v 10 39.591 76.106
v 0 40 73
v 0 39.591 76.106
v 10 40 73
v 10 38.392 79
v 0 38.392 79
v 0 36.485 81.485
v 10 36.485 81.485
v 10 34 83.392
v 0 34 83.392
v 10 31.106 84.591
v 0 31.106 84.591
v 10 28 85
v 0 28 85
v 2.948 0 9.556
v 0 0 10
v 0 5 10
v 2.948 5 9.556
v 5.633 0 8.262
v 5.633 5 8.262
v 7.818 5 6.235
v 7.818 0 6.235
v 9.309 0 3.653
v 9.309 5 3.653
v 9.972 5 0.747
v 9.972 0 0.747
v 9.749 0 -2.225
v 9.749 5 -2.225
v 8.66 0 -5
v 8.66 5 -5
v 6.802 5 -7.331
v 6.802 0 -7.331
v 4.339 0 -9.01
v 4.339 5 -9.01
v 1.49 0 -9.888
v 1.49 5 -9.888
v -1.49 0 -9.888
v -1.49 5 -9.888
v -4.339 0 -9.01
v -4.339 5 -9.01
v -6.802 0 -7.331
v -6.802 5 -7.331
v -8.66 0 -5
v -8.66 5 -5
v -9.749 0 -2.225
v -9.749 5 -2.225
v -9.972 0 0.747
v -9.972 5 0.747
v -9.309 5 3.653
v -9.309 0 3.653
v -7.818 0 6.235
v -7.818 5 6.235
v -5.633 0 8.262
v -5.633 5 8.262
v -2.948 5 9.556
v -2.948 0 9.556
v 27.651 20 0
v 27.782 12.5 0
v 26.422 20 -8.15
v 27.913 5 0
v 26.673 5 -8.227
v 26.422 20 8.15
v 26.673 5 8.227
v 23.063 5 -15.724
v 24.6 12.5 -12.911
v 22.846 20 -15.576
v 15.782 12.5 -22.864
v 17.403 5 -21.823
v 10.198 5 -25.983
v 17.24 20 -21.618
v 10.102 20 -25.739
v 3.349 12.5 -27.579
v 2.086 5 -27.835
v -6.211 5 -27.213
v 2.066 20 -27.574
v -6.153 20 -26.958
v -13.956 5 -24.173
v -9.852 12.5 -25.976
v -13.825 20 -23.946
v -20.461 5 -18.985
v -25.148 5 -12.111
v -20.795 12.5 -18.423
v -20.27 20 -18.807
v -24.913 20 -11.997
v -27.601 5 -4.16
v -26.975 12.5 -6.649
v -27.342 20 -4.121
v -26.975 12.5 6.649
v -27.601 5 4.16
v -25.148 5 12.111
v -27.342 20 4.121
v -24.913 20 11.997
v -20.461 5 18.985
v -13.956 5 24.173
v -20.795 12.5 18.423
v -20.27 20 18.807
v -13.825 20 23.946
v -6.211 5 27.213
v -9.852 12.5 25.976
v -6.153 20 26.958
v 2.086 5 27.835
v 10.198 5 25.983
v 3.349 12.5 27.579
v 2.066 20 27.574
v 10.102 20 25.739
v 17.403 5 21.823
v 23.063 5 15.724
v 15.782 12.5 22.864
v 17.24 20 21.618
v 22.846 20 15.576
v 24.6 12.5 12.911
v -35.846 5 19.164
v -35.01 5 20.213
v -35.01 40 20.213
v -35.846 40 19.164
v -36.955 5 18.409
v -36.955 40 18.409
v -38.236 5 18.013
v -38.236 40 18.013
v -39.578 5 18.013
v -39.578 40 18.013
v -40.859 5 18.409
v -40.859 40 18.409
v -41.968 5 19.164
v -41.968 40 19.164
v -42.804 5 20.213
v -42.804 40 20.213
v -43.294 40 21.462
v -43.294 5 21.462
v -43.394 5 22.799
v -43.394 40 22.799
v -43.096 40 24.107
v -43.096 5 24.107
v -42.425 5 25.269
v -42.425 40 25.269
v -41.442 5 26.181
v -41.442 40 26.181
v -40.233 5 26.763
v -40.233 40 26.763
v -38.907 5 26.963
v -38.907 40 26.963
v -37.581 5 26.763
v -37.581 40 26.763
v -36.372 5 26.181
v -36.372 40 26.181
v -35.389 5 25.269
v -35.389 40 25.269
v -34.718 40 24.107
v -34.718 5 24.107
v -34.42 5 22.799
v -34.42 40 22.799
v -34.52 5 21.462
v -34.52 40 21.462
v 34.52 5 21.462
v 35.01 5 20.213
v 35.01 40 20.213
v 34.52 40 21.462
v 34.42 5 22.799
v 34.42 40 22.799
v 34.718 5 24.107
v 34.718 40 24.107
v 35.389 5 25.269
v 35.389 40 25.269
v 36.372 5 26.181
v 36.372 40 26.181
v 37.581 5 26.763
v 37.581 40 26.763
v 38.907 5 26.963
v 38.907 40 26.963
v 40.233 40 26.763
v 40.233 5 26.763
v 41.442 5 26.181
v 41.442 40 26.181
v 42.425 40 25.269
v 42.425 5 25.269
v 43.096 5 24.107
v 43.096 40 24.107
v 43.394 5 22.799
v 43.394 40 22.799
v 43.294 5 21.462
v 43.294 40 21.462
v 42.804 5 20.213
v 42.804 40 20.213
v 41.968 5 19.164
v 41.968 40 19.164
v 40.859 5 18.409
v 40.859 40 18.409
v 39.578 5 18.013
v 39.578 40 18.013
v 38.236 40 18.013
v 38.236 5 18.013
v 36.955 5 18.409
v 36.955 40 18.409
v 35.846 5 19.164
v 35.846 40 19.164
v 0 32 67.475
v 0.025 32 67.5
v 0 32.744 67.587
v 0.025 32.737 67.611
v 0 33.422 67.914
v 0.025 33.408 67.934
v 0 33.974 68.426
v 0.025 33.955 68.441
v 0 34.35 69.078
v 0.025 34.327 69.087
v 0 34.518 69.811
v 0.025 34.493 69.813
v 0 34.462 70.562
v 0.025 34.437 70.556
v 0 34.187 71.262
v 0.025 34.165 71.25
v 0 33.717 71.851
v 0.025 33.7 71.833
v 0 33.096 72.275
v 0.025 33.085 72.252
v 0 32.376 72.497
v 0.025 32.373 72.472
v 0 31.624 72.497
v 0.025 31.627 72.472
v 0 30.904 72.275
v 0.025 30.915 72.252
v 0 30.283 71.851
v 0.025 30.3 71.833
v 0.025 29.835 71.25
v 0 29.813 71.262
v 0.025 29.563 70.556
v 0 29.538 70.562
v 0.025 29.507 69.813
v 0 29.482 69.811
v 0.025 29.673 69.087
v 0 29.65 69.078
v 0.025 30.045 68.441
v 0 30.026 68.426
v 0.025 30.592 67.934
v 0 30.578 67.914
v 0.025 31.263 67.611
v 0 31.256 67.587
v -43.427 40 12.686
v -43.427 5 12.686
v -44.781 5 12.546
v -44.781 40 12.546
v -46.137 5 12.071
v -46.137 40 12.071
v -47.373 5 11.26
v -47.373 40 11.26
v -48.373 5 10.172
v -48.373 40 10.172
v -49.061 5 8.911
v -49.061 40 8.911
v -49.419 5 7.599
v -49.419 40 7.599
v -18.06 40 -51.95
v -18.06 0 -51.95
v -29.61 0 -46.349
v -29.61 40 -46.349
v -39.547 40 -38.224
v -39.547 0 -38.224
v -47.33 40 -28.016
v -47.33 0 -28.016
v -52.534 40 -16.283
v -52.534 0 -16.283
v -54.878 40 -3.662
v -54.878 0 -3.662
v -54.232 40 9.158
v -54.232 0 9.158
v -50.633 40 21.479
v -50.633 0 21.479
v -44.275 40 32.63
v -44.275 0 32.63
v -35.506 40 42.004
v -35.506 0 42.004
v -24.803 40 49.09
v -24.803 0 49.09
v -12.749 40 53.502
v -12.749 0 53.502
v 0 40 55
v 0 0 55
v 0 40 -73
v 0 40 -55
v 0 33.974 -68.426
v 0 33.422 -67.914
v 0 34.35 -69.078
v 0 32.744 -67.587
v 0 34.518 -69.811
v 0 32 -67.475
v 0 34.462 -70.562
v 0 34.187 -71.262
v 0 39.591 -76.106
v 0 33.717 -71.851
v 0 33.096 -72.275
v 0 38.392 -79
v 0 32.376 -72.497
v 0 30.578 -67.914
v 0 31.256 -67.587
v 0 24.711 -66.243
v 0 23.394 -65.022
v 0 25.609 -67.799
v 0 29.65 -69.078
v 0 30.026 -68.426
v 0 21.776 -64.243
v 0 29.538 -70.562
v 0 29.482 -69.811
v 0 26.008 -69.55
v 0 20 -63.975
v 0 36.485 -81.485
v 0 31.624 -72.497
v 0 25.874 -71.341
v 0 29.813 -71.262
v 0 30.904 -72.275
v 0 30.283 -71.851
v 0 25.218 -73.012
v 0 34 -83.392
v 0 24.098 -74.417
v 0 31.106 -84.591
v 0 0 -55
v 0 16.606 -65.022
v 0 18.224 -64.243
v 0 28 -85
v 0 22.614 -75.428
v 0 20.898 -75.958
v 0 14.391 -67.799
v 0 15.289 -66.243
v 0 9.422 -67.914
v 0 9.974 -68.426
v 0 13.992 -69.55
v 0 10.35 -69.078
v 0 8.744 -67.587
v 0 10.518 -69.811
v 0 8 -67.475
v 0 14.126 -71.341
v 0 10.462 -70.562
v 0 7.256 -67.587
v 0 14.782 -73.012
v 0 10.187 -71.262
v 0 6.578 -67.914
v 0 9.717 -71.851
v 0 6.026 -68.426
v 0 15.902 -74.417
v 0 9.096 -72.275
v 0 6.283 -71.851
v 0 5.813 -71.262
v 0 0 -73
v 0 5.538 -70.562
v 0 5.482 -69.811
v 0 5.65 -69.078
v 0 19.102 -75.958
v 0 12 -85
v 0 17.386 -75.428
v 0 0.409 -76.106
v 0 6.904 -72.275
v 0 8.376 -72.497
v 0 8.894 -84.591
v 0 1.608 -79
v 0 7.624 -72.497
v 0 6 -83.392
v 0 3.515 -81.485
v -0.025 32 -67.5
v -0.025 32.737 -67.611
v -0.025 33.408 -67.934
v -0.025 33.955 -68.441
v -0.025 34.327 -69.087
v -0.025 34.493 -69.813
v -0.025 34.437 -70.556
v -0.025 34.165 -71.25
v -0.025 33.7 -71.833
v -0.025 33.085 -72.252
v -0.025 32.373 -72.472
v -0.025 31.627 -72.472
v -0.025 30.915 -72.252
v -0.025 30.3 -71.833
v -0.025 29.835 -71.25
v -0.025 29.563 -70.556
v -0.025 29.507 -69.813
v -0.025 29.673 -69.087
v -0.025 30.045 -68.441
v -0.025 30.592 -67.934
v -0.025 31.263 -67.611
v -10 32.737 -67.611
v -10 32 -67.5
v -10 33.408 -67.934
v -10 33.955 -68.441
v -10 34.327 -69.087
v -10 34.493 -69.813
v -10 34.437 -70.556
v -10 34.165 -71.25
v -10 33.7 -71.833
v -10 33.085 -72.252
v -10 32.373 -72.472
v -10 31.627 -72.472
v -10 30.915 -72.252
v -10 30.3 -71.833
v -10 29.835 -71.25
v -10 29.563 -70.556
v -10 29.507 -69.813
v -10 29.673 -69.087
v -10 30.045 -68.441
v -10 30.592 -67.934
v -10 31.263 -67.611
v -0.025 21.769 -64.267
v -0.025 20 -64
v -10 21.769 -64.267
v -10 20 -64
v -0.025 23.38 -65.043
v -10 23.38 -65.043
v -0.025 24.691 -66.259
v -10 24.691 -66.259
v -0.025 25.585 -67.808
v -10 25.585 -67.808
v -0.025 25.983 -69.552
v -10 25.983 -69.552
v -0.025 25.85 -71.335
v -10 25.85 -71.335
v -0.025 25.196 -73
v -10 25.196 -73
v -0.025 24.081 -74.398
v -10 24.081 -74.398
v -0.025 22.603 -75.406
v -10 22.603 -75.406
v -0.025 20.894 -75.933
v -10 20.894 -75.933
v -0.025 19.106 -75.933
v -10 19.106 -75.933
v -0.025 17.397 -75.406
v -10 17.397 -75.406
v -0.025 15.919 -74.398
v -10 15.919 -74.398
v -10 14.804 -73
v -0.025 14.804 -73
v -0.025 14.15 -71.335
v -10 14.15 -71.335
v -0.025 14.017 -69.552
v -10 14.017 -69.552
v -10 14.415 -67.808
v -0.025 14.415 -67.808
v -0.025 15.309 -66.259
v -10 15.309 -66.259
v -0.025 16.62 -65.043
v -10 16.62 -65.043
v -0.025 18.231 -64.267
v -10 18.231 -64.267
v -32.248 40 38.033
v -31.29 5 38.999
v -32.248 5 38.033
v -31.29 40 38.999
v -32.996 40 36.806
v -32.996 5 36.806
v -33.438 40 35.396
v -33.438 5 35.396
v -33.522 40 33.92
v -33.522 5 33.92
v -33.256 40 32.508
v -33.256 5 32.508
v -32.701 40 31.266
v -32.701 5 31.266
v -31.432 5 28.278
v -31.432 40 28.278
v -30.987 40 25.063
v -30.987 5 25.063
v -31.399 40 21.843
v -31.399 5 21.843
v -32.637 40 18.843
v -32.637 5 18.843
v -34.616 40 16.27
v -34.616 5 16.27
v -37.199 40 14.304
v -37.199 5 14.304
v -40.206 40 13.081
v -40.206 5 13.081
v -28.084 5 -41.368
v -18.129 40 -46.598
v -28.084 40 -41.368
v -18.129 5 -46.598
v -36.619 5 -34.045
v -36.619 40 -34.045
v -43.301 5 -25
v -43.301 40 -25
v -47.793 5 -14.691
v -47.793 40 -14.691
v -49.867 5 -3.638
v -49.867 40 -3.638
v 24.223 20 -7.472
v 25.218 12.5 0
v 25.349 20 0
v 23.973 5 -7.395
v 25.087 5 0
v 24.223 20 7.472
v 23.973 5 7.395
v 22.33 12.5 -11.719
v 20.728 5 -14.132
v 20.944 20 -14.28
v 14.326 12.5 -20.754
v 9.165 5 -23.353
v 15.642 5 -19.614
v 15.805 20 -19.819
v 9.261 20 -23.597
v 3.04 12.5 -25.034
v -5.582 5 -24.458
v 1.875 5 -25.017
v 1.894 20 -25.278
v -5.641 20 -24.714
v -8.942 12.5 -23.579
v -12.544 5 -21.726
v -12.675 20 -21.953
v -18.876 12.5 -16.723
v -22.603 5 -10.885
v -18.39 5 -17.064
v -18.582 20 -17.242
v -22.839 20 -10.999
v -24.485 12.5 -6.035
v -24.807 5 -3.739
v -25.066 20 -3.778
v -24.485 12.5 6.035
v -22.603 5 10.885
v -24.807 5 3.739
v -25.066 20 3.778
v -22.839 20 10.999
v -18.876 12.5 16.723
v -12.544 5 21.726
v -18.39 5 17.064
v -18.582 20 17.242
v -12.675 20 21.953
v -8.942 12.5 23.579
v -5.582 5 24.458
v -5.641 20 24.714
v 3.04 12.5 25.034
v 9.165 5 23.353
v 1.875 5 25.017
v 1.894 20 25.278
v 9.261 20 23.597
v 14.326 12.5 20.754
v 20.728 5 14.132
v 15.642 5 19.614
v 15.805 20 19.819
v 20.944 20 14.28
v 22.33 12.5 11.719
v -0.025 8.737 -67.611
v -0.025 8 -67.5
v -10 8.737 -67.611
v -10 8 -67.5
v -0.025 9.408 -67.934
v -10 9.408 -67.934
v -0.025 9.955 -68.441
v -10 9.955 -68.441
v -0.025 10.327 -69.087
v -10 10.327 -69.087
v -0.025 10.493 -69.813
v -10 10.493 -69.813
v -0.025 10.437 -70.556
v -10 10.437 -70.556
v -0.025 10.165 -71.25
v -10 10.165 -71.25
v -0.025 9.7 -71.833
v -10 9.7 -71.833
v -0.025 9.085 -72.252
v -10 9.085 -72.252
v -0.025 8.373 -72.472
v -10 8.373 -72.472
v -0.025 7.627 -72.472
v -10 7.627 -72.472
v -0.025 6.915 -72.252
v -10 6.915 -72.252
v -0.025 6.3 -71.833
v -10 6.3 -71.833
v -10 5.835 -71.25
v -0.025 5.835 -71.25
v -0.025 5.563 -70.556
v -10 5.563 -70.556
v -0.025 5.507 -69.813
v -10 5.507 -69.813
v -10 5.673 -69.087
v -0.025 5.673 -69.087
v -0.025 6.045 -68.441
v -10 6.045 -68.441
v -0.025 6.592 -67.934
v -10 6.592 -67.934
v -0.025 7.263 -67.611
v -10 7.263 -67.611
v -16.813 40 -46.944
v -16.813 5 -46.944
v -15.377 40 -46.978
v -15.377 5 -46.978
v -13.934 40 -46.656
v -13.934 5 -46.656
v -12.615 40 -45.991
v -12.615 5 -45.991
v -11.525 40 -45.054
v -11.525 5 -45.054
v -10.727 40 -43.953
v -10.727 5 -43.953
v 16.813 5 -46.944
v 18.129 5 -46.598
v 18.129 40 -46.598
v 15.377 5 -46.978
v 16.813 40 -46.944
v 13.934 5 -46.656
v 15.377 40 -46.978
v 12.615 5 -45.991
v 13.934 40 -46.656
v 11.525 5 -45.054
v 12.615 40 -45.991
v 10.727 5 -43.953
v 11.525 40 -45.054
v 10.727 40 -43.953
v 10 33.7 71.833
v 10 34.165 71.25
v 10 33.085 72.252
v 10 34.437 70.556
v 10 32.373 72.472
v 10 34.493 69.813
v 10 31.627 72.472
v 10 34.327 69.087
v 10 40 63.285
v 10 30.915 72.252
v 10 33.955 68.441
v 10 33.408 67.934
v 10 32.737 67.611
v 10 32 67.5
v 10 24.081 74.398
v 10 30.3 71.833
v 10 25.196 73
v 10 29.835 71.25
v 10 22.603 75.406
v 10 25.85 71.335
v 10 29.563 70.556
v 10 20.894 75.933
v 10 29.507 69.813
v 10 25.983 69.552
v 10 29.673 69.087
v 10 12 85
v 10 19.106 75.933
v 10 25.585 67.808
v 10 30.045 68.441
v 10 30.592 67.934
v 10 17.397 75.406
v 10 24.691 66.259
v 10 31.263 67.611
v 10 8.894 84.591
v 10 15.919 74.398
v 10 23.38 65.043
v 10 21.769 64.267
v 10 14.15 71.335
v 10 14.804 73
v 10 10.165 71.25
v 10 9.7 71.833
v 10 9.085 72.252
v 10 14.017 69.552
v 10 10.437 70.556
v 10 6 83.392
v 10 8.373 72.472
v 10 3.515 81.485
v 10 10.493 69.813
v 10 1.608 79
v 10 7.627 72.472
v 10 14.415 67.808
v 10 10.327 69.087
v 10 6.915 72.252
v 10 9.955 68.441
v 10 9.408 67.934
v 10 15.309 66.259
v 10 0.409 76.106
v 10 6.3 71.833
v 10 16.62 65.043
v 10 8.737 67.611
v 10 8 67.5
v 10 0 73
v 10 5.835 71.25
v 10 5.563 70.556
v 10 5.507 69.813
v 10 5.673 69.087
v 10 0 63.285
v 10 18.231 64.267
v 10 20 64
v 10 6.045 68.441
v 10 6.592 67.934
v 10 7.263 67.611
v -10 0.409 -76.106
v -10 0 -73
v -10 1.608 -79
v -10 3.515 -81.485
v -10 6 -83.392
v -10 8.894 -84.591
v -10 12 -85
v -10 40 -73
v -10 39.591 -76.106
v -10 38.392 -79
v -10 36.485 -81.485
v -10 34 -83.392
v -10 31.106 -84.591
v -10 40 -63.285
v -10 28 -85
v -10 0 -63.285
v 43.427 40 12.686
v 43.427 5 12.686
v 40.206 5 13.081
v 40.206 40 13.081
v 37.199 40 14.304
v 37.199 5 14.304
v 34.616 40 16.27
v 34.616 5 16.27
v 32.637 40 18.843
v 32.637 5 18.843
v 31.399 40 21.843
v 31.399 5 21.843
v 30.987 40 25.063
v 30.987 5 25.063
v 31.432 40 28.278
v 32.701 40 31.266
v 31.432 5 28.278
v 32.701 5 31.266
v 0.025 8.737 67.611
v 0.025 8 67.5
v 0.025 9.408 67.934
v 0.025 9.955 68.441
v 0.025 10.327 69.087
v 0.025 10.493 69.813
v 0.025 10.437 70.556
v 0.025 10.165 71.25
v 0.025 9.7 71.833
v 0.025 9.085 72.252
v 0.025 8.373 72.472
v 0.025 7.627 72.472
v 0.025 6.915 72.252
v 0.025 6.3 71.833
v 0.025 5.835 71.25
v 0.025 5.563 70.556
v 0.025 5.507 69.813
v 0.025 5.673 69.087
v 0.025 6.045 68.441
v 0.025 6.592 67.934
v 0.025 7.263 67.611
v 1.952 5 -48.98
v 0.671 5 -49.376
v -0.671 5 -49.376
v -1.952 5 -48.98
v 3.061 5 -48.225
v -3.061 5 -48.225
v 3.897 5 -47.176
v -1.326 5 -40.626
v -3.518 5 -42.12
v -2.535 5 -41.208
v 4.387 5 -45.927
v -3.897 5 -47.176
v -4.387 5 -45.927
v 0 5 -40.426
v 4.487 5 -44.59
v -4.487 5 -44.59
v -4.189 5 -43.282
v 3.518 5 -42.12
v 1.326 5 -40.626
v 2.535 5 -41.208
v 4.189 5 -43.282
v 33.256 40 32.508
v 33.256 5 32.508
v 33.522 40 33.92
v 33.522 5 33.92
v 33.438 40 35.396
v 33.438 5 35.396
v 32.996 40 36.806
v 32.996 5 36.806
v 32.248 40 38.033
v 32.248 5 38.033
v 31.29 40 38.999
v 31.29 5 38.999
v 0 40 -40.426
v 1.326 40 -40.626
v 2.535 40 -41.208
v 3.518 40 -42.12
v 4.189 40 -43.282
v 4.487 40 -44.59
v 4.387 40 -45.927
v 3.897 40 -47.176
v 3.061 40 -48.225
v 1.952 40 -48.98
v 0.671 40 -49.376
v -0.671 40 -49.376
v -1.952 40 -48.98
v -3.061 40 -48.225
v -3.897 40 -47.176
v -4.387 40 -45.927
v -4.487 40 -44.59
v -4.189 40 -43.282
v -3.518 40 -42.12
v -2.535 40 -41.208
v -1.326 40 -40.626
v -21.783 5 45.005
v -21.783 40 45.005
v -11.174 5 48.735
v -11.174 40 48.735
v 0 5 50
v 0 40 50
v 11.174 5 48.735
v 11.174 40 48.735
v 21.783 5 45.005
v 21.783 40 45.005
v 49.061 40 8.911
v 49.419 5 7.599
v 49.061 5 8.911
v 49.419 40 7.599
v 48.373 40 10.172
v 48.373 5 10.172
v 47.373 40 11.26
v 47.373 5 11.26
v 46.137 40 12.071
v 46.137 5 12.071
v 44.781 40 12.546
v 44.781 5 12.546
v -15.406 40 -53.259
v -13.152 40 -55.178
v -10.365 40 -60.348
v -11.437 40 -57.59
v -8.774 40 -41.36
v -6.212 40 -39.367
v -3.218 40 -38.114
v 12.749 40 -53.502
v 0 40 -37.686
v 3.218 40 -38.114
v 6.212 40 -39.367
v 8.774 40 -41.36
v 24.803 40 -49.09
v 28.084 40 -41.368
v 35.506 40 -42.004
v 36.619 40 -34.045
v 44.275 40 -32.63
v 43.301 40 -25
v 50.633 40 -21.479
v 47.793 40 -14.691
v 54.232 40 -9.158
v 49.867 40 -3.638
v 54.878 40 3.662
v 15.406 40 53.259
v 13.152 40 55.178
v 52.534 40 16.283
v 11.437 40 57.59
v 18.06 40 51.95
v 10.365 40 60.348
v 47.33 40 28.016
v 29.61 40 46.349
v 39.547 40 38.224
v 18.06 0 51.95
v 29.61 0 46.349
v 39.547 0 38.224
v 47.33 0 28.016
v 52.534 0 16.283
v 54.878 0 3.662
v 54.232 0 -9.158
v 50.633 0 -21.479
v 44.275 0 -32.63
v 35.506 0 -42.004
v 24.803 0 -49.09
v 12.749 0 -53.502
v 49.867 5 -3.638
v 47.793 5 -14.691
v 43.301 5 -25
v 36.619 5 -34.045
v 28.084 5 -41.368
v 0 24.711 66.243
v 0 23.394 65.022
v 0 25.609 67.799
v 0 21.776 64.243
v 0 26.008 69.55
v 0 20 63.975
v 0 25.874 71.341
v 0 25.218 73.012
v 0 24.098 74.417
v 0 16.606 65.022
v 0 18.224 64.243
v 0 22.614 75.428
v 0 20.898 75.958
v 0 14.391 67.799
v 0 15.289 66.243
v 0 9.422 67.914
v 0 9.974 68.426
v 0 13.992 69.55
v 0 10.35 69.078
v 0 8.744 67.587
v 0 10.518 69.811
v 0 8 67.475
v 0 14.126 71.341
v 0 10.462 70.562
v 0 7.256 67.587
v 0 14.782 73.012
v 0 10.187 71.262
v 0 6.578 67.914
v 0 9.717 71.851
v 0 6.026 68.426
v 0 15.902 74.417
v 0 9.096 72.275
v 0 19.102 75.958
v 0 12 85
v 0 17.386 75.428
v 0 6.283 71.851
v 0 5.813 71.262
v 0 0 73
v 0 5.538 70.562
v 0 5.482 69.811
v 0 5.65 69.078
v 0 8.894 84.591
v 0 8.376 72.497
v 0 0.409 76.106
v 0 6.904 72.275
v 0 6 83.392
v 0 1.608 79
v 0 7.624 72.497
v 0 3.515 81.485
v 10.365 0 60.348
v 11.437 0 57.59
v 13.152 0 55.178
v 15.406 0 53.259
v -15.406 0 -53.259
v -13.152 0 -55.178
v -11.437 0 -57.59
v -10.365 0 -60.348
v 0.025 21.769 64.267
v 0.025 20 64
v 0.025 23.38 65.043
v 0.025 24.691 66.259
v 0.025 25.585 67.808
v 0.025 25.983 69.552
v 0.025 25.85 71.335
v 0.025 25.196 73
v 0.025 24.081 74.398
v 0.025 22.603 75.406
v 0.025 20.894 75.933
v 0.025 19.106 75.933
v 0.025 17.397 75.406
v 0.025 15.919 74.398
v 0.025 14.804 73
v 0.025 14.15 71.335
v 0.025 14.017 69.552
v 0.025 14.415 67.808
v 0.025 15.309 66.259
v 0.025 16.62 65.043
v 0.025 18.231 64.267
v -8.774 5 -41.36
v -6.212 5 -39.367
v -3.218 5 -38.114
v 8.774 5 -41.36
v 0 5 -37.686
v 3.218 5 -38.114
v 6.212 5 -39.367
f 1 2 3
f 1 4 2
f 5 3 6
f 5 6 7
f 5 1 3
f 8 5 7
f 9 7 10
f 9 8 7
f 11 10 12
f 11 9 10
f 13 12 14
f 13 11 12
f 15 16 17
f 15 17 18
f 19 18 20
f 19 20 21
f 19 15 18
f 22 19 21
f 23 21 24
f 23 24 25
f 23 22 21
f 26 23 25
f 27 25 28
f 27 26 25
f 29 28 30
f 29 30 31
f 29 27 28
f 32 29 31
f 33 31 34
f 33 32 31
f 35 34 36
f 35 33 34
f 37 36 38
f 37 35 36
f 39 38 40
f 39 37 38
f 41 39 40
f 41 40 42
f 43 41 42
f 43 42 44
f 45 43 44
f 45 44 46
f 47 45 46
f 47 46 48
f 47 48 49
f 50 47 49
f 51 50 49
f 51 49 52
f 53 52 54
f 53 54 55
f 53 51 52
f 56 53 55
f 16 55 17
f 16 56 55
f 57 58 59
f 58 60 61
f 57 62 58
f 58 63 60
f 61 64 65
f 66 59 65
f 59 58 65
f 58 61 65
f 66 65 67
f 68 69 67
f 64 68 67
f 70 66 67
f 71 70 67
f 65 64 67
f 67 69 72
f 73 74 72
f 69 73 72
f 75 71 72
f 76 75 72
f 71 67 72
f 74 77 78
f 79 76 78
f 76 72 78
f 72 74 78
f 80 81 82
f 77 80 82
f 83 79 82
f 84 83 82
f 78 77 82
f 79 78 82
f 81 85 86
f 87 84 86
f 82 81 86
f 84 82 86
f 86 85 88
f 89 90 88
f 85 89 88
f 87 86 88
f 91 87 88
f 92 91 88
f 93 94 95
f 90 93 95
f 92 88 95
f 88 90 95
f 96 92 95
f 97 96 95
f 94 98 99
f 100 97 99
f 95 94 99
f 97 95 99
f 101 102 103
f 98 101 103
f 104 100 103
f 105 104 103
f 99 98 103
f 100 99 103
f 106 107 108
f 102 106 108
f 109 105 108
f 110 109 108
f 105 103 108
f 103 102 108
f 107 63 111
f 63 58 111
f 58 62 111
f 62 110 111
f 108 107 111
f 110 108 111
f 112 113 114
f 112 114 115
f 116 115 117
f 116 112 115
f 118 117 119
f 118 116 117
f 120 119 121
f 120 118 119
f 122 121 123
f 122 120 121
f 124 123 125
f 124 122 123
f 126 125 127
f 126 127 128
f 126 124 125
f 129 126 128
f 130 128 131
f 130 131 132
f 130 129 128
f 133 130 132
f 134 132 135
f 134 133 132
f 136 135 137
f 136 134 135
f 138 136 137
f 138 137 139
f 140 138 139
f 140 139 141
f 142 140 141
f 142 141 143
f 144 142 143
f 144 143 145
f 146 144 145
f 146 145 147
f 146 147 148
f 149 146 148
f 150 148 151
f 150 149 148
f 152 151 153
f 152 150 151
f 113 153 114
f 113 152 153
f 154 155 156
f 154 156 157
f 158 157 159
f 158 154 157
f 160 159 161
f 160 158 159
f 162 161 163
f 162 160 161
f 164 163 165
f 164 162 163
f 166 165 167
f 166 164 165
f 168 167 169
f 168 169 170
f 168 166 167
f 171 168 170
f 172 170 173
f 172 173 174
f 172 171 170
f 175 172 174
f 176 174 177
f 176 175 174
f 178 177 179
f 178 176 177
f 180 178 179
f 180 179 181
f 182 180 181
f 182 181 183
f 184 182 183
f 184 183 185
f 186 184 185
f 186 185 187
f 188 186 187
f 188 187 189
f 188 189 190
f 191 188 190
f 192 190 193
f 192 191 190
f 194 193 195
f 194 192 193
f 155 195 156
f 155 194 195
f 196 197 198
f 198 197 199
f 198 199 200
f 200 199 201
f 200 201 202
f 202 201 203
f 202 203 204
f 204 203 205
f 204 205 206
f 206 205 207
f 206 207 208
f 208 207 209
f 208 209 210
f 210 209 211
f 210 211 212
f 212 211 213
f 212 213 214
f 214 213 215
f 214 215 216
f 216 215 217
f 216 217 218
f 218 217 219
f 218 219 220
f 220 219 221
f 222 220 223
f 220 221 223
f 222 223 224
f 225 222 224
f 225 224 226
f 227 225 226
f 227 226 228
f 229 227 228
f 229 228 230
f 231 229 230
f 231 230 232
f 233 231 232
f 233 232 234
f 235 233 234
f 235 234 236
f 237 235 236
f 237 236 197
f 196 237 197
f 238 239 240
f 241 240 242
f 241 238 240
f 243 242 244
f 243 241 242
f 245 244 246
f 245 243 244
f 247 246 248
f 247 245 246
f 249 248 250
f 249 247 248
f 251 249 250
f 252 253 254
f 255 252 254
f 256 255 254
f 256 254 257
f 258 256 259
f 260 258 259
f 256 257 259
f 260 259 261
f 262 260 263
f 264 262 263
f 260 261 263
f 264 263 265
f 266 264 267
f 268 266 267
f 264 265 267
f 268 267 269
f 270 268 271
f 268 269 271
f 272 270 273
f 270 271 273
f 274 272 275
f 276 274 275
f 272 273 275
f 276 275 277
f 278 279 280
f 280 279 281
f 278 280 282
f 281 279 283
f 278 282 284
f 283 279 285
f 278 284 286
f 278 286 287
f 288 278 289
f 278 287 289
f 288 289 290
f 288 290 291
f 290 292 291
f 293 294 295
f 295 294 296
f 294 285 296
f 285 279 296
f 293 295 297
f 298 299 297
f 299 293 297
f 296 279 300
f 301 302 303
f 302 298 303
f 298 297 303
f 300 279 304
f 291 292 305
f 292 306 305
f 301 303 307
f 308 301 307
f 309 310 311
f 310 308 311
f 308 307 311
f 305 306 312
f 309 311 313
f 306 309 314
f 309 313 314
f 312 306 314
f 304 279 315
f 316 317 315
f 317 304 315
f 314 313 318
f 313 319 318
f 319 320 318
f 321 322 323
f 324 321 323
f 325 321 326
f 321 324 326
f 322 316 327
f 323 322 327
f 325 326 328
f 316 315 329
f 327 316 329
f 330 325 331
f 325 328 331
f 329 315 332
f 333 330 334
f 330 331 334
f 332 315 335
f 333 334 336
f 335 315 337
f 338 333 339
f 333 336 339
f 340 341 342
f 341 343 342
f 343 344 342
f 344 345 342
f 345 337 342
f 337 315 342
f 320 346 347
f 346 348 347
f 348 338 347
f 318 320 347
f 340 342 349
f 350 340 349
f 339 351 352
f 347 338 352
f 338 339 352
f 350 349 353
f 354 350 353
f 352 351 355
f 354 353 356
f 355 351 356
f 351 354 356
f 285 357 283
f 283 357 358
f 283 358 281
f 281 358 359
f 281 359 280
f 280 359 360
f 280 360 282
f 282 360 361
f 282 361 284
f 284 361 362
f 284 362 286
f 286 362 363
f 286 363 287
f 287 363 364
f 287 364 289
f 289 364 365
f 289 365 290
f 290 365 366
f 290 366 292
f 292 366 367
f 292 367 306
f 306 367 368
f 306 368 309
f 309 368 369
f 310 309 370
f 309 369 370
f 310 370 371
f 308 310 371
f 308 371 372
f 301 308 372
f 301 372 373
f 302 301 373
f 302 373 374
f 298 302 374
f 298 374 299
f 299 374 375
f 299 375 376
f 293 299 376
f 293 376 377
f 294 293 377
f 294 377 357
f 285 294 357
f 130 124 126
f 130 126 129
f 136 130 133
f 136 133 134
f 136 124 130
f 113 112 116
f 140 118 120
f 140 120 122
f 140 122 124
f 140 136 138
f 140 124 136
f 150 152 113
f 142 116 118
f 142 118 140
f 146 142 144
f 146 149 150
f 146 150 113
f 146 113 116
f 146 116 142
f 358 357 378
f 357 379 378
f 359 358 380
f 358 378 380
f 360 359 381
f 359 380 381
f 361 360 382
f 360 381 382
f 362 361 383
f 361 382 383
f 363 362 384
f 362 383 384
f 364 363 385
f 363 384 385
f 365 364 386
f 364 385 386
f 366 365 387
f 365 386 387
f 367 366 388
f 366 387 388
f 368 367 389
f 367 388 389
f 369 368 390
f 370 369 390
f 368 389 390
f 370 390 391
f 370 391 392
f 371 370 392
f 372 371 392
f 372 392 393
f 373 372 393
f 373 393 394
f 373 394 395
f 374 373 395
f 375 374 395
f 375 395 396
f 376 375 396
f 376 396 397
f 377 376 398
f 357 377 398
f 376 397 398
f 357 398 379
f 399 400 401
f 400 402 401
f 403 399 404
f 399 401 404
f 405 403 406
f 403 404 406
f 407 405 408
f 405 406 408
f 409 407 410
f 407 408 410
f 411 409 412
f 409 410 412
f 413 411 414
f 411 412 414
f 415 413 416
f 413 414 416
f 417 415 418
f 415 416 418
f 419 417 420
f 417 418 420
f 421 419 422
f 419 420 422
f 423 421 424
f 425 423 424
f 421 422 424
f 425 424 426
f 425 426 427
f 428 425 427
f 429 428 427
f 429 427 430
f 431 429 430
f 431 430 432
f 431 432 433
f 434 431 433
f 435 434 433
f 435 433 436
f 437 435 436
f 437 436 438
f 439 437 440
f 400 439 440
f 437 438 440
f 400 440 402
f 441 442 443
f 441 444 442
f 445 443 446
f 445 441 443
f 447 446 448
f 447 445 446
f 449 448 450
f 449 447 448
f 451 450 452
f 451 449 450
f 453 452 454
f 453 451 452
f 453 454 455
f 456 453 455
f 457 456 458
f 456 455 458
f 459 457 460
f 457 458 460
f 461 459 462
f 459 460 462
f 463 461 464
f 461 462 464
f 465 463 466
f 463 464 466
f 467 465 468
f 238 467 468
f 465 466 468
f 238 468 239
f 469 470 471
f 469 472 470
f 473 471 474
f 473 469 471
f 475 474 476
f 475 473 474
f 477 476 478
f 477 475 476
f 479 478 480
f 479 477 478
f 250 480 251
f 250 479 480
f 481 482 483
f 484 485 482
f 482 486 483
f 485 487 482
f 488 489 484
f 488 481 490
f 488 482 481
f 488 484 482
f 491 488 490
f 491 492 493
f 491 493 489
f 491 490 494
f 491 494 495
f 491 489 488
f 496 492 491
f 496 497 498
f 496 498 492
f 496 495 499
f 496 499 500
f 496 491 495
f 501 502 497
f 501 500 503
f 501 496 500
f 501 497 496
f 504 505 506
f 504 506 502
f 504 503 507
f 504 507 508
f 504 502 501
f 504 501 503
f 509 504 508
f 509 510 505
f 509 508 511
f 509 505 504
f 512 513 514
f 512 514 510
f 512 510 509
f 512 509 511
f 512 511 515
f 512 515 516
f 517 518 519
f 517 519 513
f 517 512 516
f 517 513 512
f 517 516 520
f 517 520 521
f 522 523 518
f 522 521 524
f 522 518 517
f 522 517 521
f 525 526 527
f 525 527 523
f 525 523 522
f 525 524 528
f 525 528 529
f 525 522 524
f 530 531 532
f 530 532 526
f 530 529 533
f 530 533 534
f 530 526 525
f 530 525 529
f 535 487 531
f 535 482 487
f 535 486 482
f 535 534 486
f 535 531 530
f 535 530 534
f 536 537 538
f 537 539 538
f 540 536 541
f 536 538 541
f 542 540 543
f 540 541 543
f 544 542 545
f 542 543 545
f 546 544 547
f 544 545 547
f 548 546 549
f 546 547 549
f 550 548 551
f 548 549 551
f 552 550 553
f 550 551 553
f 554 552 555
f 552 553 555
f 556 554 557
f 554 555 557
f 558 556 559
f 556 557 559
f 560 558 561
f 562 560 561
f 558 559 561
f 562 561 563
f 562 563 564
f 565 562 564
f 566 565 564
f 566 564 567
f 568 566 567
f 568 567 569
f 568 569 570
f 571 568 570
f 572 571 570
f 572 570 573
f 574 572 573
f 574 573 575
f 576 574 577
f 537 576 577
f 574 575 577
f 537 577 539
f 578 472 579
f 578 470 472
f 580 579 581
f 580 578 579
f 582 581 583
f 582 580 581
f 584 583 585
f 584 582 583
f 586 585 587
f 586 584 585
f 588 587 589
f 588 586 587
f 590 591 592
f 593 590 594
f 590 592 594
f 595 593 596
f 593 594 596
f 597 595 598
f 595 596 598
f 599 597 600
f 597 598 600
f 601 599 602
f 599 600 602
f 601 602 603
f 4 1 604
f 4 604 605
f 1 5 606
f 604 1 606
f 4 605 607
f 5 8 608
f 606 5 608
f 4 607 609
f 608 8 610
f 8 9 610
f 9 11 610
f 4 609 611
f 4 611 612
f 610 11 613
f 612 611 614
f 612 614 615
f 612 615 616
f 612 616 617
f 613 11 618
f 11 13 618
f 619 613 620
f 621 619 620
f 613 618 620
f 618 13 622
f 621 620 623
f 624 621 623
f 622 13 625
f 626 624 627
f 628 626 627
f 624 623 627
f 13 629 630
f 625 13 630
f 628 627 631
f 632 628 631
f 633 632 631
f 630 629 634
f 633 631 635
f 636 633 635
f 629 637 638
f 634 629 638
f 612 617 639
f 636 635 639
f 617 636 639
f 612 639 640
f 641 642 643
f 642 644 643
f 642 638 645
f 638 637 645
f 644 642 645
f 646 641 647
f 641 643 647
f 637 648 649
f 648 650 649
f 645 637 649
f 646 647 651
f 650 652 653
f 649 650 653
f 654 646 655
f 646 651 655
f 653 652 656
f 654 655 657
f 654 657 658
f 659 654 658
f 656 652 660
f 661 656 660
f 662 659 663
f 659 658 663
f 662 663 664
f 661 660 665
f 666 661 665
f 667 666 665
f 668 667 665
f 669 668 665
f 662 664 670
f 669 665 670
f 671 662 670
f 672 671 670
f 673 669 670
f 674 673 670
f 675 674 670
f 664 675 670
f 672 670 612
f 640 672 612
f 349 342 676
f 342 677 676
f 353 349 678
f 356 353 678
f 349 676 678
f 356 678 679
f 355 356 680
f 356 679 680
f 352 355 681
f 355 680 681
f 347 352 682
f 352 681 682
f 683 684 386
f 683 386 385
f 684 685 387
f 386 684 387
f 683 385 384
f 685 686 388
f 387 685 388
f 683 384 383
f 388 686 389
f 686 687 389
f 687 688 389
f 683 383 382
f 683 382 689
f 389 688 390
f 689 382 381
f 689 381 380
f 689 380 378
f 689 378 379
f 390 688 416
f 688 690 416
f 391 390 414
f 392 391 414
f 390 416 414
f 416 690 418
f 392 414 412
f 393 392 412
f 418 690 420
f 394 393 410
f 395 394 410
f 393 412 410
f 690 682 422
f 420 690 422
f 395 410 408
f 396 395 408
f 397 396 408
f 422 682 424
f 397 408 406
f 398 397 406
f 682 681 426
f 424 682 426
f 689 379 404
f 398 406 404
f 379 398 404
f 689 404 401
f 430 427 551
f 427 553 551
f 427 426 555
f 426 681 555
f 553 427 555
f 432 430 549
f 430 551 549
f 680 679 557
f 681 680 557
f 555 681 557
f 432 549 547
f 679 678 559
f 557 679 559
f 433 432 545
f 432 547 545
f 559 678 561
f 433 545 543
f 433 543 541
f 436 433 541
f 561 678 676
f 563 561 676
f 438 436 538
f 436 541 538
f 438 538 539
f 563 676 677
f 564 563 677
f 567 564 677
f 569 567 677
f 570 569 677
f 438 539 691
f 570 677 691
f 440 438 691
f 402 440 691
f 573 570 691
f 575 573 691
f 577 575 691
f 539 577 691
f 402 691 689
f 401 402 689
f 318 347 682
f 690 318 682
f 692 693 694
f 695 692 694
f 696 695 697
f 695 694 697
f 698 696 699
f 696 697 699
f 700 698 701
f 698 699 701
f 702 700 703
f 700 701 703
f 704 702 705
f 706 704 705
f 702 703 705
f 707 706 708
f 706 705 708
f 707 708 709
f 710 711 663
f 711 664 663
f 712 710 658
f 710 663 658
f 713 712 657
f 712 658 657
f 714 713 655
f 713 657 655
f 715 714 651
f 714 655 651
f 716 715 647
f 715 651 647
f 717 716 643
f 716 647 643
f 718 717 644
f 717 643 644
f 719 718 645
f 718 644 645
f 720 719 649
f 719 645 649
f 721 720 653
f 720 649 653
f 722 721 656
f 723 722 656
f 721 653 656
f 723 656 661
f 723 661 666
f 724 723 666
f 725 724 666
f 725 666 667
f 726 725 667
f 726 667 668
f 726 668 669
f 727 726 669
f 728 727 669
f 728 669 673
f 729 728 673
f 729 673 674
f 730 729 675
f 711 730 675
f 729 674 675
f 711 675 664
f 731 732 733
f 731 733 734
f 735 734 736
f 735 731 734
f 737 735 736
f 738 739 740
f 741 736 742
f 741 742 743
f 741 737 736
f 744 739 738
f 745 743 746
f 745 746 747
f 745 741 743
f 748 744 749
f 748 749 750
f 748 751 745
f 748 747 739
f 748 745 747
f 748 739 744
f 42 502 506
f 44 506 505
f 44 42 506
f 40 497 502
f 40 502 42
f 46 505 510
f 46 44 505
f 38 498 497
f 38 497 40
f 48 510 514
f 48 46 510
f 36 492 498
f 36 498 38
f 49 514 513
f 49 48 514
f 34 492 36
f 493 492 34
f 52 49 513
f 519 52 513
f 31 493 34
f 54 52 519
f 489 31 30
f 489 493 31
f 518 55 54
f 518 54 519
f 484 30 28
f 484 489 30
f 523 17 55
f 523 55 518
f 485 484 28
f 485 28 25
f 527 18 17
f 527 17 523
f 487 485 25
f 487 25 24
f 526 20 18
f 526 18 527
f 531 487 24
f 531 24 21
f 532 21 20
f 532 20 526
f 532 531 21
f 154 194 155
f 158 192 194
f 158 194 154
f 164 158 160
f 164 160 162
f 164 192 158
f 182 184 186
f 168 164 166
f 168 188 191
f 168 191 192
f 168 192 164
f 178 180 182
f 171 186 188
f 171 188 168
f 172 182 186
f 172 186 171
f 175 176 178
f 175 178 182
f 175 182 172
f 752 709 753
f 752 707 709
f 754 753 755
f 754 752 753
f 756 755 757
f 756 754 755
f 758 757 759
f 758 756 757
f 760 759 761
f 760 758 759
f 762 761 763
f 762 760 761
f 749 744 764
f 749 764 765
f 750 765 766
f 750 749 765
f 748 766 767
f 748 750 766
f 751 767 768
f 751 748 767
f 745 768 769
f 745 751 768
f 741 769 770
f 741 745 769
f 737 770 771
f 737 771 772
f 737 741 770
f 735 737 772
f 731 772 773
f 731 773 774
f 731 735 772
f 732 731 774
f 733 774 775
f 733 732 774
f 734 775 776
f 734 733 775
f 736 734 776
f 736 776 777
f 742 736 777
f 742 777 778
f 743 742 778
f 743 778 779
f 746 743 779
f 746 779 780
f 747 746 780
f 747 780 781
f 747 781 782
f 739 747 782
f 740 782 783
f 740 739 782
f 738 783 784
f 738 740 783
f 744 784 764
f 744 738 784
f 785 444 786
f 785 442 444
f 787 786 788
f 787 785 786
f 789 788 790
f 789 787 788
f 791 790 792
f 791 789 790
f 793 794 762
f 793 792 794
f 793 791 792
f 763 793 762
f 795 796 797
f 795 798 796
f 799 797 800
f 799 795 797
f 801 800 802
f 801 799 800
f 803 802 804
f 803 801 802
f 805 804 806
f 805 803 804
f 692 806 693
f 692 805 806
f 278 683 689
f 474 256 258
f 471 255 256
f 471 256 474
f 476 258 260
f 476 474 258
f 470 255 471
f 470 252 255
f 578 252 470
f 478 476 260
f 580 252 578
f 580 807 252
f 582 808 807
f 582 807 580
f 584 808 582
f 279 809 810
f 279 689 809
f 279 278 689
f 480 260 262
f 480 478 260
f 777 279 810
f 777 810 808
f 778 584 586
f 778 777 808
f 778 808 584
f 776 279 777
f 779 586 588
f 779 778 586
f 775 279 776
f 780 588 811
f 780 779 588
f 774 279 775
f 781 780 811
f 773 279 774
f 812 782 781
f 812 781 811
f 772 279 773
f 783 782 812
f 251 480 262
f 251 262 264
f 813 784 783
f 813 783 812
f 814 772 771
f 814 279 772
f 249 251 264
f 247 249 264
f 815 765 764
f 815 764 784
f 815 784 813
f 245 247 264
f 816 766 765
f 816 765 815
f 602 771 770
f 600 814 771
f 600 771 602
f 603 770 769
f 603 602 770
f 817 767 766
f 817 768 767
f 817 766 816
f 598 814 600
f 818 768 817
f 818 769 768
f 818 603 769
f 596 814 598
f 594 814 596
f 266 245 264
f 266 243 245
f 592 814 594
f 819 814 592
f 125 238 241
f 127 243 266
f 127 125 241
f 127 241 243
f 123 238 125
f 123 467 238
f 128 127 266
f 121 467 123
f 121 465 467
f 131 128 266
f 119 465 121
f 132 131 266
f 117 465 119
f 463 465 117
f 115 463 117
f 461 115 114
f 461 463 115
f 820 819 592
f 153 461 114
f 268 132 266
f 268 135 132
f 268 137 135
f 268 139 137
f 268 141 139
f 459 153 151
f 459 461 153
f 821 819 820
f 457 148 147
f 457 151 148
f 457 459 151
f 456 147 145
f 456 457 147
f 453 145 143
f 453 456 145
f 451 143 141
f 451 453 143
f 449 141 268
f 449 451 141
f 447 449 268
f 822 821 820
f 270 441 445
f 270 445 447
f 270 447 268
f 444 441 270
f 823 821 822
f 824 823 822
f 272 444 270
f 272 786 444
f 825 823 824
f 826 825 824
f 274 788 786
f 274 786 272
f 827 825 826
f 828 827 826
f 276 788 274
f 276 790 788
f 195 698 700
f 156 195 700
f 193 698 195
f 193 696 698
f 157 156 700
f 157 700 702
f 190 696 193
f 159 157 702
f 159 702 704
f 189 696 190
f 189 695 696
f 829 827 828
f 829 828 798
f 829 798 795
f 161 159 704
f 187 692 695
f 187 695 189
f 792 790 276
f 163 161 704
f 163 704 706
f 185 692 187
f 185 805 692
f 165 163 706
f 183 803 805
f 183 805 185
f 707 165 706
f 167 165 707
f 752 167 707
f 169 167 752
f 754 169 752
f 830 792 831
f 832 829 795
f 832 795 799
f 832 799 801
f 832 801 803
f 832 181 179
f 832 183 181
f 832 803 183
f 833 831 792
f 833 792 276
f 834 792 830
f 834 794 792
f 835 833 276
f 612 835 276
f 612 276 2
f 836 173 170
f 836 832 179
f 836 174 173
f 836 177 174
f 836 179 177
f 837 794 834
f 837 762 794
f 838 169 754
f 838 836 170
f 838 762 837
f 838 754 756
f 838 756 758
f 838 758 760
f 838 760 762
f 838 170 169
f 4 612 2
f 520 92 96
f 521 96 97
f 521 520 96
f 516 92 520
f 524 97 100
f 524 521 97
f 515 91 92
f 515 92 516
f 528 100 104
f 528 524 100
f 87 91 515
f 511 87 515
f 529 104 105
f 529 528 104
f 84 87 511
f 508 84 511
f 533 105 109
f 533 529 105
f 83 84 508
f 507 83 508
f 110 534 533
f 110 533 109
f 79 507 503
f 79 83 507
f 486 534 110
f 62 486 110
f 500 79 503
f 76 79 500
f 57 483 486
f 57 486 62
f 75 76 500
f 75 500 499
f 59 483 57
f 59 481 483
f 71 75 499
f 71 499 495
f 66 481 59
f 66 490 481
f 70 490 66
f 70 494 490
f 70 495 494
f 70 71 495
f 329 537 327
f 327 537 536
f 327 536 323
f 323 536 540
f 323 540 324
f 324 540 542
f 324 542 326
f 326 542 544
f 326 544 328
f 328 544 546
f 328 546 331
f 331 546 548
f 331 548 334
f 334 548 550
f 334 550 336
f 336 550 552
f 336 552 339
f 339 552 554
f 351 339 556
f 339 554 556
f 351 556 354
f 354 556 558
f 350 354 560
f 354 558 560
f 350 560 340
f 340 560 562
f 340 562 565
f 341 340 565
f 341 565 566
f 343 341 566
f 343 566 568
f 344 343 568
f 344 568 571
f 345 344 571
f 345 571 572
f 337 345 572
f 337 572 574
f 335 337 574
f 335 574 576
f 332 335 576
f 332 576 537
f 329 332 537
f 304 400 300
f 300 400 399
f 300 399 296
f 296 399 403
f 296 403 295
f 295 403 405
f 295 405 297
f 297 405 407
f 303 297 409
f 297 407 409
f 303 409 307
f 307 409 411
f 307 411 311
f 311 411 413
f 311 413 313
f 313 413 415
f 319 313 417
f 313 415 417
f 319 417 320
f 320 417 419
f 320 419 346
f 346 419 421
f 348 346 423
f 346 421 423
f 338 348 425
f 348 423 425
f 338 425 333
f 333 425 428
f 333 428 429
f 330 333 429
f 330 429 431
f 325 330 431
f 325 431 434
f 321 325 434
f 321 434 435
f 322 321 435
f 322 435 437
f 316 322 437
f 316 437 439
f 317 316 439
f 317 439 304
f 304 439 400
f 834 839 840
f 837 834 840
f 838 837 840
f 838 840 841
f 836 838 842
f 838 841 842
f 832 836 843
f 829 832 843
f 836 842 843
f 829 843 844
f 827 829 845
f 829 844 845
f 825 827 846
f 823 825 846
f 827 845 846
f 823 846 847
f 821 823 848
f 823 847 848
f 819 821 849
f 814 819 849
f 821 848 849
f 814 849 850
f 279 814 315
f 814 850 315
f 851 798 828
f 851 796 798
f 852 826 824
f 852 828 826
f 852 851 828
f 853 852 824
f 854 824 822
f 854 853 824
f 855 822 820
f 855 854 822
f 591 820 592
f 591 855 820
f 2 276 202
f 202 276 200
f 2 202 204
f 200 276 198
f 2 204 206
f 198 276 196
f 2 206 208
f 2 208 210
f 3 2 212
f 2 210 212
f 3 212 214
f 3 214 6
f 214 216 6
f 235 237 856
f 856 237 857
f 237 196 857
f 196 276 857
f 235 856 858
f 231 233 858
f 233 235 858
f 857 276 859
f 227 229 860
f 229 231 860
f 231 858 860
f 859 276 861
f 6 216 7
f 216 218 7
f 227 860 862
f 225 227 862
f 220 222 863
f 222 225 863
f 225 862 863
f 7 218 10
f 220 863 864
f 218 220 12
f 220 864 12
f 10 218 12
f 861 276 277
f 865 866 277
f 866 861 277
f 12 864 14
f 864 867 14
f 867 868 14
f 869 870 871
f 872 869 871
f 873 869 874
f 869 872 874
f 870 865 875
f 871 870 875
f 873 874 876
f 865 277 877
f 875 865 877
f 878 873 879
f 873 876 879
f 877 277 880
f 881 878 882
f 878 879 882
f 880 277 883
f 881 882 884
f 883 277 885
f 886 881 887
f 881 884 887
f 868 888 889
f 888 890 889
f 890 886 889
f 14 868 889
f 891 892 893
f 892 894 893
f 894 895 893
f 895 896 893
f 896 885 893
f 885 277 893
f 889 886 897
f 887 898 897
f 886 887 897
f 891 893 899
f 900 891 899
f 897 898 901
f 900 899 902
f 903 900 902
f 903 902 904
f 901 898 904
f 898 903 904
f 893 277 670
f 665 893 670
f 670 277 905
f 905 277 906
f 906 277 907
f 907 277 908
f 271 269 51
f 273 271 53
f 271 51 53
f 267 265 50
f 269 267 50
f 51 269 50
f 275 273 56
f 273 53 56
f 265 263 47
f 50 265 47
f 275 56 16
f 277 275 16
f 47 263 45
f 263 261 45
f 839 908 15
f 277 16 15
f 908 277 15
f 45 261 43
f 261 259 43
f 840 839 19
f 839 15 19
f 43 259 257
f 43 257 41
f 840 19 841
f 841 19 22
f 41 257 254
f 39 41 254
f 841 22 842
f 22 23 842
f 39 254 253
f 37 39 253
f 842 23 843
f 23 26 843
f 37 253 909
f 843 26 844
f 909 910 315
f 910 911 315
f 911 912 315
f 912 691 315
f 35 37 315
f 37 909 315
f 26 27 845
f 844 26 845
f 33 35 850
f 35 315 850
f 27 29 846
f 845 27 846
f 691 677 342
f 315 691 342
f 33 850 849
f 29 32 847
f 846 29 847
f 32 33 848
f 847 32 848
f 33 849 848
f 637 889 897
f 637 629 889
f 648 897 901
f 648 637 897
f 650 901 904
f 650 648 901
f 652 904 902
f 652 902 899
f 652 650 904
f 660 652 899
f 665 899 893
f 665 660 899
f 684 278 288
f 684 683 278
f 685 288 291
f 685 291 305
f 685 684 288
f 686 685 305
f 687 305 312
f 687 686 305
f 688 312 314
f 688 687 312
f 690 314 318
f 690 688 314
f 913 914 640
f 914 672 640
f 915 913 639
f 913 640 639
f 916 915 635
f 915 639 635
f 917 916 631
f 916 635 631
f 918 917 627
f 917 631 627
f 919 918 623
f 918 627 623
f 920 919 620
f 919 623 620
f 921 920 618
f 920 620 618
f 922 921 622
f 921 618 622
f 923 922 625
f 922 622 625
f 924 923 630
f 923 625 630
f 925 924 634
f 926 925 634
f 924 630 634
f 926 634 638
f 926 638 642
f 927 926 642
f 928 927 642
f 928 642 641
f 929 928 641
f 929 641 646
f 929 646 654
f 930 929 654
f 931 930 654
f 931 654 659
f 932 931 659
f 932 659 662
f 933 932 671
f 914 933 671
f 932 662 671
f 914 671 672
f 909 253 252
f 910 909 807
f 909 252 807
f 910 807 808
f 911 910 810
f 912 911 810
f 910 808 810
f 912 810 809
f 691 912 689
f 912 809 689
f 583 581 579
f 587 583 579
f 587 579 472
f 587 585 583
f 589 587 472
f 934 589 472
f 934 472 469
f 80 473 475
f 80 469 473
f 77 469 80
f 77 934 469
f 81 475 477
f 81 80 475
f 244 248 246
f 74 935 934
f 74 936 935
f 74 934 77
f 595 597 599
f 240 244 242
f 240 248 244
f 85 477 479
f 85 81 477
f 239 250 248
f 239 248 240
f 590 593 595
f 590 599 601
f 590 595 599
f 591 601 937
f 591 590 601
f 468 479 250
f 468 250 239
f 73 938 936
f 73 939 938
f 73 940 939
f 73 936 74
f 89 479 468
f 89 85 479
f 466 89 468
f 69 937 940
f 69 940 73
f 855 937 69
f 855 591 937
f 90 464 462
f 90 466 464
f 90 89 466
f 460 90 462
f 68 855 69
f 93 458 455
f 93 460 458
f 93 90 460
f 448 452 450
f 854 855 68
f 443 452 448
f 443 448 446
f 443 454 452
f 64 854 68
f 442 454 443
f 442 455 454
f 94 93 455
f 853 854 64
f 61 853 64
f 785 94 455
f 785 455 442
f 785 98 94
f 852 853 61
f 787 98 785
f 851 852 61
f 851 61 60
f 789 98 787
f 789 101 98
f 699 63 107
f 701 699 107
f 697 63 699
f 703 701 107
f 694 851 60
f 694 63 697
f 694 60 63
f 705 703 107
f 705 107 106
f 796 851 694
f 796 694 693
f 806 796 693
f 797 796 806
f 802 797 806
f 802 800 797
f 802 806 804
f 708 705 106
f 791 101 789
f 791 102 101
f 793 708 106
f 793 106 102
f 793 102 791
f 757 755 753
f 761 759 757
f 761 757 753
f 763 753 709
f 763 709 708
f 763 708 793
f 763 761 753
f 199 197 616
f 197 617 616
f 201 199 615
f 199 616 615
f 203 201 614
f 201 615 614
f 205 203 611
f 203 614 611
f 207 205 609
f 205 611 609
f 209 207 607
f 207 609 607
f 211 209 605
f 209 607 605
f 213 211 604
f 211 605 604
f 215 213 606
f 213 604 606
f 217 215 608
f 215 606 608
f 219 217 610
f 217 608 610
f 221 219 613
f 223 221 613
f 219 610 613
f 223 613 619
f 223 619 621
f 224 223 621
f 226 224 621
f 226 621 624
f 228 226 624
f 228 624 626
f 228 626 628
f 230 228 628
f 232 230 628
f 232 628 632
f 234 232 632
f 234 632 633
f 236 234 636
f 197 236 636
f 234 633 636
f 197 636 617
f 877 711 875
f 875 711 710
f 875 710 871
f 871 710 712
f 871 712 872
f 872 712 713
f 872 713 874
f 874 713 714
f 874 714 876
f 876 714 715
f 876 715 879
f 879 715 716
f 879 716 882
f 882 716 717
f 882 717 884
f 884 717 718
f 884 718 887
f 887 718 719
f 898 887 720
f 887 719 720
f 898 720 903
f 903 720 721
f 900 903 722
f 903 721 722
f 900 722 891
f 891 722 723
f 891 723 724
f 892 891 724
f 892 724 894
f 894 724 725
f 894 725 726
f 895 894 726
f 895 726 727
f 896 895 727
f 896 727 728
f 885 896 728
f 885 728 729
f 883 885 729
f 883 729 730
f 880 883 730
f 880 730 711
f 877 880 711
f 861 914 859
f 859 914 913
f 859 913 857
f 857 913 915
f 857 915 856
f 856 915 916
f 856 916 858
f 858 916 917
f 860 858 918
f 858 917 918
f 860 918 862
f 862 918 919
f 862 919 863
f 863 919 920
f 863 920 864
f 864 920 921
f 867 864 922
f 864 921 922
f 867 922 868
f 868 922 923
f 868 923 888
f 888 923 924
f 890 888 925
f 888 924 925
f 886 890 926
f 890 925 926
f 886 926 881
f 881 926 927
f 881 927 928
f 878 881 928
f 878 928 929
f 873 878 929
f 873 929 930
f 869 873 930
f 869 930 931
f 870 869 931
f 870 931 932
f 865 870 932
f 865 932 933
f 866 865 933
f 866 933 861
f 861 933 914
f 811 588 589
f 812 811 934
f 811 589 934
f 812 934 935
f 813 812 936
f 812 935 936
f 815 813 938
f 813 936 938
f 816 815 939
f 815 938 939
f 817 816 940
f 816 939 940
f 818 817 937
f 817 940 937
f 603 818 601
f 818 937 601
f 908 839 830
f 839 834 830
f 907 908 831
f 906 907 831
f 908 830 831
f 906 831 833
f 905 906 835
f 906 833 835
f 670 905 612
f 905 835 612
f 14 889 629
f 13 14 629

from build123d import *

# Parameters (mm, degrees)
SKETCH1_R                        = 55
SKETCH1_R_2                      = 50
BOSS_EXTRUDE1_DEPTH              = 40
SKETCH1_2_R                      = 50
SKETCH1_2_R_2                    = 10
BOSS_EXTRUDE2_DEPTH              = 5
SKETCH1_4_R                      = 28
SKETCH1_4_R_2                    = 25
BOSS_EXTRUDE8_DEPTH              = 20
BOSS_EXTRUDE8_DRAFT              = 1
SKETCH2_R                        = 4.5
BOSS_EXTRUDE3_DEPTH              = 35
FILLET1_R                        = 6
CIRPATTERN1_COUNT                = 3
FILLET1_OF_CIRPATTERN1_R         = 6
BOSS_EXTRUDE7_DEPTH              = 40
FILLET2_R                        = 12
F_5_0MM_DOWEL_HOLE1_D            = 5
F_5_0MM_DOWEL_HOLE1_CSINK_D      = 5.05
F_5_0MM_DOWEL_HOLE1_CSINK_ANGLE  = 90
F_12_0MM_DOWEL_HOLE1_D           = 12
F_12_0MM_DOWEL_HOLE1_CSINK_D     = 12.05
F_12_0MM_DOWEL_HOLE1_CSINK_ANGLE = 90
FILLET3_R                        = 12
CIRPATTERN2_COUNT                = 2
FILLET2_OF_CIRPATTERN2_R         = 12
FILLET3_OF_CIRPATTERN2_R         = 12


with BuildPart() as part:
    # Sketch1 → Boss-Extrude1 (new body)
    with BuildSketch(Plane(origin=(0, 0, 0), x_dir=(1, 0, 0), z_dir=(0, 1, 0))):
        with Locations(Location((0, 0, 0), (0, 0, 270))):
            Circle(SKETCH1_R)
        with Locations(Location((0, 0, 0), (0, 0, 270))):
            Circle(SKETCH1_R_2, mode=Mode.SUBTRACT)
    extrude(amount=BOSS_EXTRUDE1_DEPTH)

    # Sketch1<2> → Boss-Extrude2 (add)
    with BuildSketch(Plane(origin=(0, 0, 0), x_dir=(1, 0, 0), z_dir=(0, 1, 0))):
        with Locations(Location((0, 0, 0), (0, 0, 270))):
            Circle(SKETCH1_2_R)
        with Locations(Location((0, 0, 0), (0, 0, 270))):
            Circle(SKETCH1_2_R_2, mode=Mode.SUBTRACT)
    extrude(amount=BOSS_EXTRUDE2_DEPTH)


with BuildPart() as boss_extrude8_tool:
    # Sketch1<4> → Boss-Extrude8 (with draft: the straight prism first)
    with BuildSketch(Plane(origin=(0, 0, 0), x_dir=(1, 0, 0), z_dir=(0, 1, 0))):
        Circle(SKETCH1_4_R)
        Circle(SKETCH1_4_R_2, mode=Mode.SUBTRACT)
    extrude(amount=BOSS_EXTRUDE8_DEPTH)
    # Boss-Extrude8: the draft: its side faces are tilted about the plane it starts from
    boss_extrude8_sides = [boss_extrude8_tool.faces().sort_by_distance(p)[0] for p in [
        (-28, 10, 0),
        (-25, 10, 0),
    ]]
    draft(boss_extrude8_sides, Plane(origin=(0, 0, 0), x_dir=(1, 0, 0), z_dir=(0, 1, 0)), BOSS_EXTRUDE8_DRAFT)


with BuildPart() as part_1:
    add(part.part)

    # Boss-Extrude8: add boss_extrude8_tool
    add(boss_extrude8_tool.part)

    # Sketch2 → Boss-Extrude3 (add)
    with BuildSketch(Plane(origin=(0, 5, 0), x_dir=(1, 0, 0), z_dir=(0, 1, 0))):
        with BuildLine():
            ThreePointArc((-12.220451707, 48.483611252), (0, 37.685826265), (12.220451707, 48.483611252))
            ThreePointArc((12.220451707, 48.483611252), (0, 50), (-12.220451707, 48.483611252))
        make_face()
        with Locations(Location((0, 44.925923132, 0), (0, 0, 270))):
            Circle(SKETCH2_R, mode=Mode.SUBTRACT)
    boss_extrude3 = extrude(amount=BOSS_EXTRUDE3_DEPTH)

    # Fillet1
    fillet1_edges = [part_1.edges().sort_by_distance(p)[0] for p in [
        (12.220451707, 22.5, -48.483611252),
        (-12.220451707, 22.5, -48.483611252),
    ]]
    fillet(fillet1_edges, radius=FILLET1_R)

    # CirPattern1: Boss-Extrude3 ×3 about axis
    cirpattern1_axis = Axis((0, 0, 0), (0, 1, 0))
    for i in range(1, CIRPATTERN1_COUNT):
        add(boss_extrude3.rotate(cirpattern1_axis, i * 360 / CIRPATTERN1_COUNT))

    # Fillet1 of CirPattern1
    fillet1_of_cirpattern1_edges = [part_1.edges().sort_by_distance(p)[0] for p in [
        (-48.098264865, 22.5, 13.658584002),
        (-35.877813158, 22.5, 34.825027251),
        (35.877813158, 22.5, 34.825027251),
        (48.098264865, 22.5, 13.658584002),
    ]]
    fillet(fillet1_of_cirpattern1_edges, radius=FILLET1_OF_CIRPATTERN1_R)

    # Sketch3 → Boss-Extrude7 (add)
    with BuildSketch(Plane.XZ):
        with BuildLine():
            Line((0, -55), (0, -85))
            Line((0, -85), (-10, -85))
            Line((-10, -85), (-10, -54.083269132))
            ThreePointArc((-10, -54.083269132), (-5.02096593, -54.770337785), (0, -55))
        make_face()
    boss_extrude7 = extrude(amount=-BOSS_EXTRUDE7_DEPTH)

    # Fillet2
    fillet2_edges = [part_1.edges().sort_by_distance(p)[0] for p in [
        (-10, 20, -54.083269132),
    ]]
    fillet(fillet2_edges, radius=FILLET2_R)

    # Ø5.0mm Dowel Hole1 (through all)
    with Locations(Plane(origin=(0, 0, 0), x_dir=(0, 0, -1), z_dir=(1, 0, 0))):
        with Locations((70, 32), (70, 8)):
            f_5_0mm_dowel_hole1 = CounterSinkHole(F_5_0MM_DOWEL_HOLE1_D / 2, F_5_0MM_DOWEL_HOLE1_CSINK_D / 2, counter_sink_angle=F_5_0MM_DOWEL_HOLE1_CSINK_ANGLE)

    # Ø12.0mm Dowel Hole1 (through all)
    with Locations(Plane(origin=(0, 0, 0), x_dir=(0, 0, -1), z_dir=(1, 0, 0))):
        with Locations((70, 20)):
            f_12_0mm_dowel_hole1 = CounterSinkHole(F_12_0MM_DOWEL_HOLE1_D / 2, F_12_0MM_DOWEL_HOLE1_CSINK_D / 2, counter_sink_angle=F_12_0MM_DOWEL_HOLE1_CSINK_ANGLE)

    # Fillet3
    fillet3_edges = [part_1.edges().sort_by_distance(p)[0] for p in [
        (-5, 0, -85),
        (-5, 40, -85),
    ]]
    fillet(fillet3_edges, radius=FILLET3_R)

    # CirPattern2: Boss-Extrude7, Ø5.0mm Dowel Hole1, Ø12.0mm Dowel Hole1 ×2 about axis
    cirpattern2_axis = Axis((0, 0, 0), (0, 1, 0))
    add([boss_extrude7.rotate(cirpattern2_axis, i * 360 / CIRPATTERN2_COUNT) for i in range(1, CIRPATTERN2_COUNT)])
    add([f_5_0mm_dowel_hole1.rotate(cirpattern2_axis, i * 360 / CIRPATTERN2_COUNT) for i in range(1, CIRPATTERN2_COUNT)], mode=Mode.SUBTRACT)
    add([f_12_0mm_dowel_hole1.rotate(cirpattern2_axis, i * 360 / CIRPATTERN2_COUNT) for i in range(1, CIRPATTERN2_COUNT)], mode=Mode.SUBTRACT)

    # Fillet2 of CirPattern2
    fillet2_of_cirpattern2_edges = [part_1.edges().sort_by_distance(p)[0] for p in [
        (10, 20, 54.083269132),
    ]]
    fillet(fillet2_of_cirpattern2_edges, radius=FILLET2_OF_CIRPATTERN2_R)

    # Fillet3 of CirPattern2
    fillet3_of_cirpattern2_edges = [part_1.edges().sort_by_distance(p)[0] for p in [
        (5, 0, 85),
        (5, 40, 85),
    ]]
    fillet(fillet3_of_cirpattern2_edges, radius=FILLET3_OF_CIRPATTERN2_R)


solid = part_1.part
